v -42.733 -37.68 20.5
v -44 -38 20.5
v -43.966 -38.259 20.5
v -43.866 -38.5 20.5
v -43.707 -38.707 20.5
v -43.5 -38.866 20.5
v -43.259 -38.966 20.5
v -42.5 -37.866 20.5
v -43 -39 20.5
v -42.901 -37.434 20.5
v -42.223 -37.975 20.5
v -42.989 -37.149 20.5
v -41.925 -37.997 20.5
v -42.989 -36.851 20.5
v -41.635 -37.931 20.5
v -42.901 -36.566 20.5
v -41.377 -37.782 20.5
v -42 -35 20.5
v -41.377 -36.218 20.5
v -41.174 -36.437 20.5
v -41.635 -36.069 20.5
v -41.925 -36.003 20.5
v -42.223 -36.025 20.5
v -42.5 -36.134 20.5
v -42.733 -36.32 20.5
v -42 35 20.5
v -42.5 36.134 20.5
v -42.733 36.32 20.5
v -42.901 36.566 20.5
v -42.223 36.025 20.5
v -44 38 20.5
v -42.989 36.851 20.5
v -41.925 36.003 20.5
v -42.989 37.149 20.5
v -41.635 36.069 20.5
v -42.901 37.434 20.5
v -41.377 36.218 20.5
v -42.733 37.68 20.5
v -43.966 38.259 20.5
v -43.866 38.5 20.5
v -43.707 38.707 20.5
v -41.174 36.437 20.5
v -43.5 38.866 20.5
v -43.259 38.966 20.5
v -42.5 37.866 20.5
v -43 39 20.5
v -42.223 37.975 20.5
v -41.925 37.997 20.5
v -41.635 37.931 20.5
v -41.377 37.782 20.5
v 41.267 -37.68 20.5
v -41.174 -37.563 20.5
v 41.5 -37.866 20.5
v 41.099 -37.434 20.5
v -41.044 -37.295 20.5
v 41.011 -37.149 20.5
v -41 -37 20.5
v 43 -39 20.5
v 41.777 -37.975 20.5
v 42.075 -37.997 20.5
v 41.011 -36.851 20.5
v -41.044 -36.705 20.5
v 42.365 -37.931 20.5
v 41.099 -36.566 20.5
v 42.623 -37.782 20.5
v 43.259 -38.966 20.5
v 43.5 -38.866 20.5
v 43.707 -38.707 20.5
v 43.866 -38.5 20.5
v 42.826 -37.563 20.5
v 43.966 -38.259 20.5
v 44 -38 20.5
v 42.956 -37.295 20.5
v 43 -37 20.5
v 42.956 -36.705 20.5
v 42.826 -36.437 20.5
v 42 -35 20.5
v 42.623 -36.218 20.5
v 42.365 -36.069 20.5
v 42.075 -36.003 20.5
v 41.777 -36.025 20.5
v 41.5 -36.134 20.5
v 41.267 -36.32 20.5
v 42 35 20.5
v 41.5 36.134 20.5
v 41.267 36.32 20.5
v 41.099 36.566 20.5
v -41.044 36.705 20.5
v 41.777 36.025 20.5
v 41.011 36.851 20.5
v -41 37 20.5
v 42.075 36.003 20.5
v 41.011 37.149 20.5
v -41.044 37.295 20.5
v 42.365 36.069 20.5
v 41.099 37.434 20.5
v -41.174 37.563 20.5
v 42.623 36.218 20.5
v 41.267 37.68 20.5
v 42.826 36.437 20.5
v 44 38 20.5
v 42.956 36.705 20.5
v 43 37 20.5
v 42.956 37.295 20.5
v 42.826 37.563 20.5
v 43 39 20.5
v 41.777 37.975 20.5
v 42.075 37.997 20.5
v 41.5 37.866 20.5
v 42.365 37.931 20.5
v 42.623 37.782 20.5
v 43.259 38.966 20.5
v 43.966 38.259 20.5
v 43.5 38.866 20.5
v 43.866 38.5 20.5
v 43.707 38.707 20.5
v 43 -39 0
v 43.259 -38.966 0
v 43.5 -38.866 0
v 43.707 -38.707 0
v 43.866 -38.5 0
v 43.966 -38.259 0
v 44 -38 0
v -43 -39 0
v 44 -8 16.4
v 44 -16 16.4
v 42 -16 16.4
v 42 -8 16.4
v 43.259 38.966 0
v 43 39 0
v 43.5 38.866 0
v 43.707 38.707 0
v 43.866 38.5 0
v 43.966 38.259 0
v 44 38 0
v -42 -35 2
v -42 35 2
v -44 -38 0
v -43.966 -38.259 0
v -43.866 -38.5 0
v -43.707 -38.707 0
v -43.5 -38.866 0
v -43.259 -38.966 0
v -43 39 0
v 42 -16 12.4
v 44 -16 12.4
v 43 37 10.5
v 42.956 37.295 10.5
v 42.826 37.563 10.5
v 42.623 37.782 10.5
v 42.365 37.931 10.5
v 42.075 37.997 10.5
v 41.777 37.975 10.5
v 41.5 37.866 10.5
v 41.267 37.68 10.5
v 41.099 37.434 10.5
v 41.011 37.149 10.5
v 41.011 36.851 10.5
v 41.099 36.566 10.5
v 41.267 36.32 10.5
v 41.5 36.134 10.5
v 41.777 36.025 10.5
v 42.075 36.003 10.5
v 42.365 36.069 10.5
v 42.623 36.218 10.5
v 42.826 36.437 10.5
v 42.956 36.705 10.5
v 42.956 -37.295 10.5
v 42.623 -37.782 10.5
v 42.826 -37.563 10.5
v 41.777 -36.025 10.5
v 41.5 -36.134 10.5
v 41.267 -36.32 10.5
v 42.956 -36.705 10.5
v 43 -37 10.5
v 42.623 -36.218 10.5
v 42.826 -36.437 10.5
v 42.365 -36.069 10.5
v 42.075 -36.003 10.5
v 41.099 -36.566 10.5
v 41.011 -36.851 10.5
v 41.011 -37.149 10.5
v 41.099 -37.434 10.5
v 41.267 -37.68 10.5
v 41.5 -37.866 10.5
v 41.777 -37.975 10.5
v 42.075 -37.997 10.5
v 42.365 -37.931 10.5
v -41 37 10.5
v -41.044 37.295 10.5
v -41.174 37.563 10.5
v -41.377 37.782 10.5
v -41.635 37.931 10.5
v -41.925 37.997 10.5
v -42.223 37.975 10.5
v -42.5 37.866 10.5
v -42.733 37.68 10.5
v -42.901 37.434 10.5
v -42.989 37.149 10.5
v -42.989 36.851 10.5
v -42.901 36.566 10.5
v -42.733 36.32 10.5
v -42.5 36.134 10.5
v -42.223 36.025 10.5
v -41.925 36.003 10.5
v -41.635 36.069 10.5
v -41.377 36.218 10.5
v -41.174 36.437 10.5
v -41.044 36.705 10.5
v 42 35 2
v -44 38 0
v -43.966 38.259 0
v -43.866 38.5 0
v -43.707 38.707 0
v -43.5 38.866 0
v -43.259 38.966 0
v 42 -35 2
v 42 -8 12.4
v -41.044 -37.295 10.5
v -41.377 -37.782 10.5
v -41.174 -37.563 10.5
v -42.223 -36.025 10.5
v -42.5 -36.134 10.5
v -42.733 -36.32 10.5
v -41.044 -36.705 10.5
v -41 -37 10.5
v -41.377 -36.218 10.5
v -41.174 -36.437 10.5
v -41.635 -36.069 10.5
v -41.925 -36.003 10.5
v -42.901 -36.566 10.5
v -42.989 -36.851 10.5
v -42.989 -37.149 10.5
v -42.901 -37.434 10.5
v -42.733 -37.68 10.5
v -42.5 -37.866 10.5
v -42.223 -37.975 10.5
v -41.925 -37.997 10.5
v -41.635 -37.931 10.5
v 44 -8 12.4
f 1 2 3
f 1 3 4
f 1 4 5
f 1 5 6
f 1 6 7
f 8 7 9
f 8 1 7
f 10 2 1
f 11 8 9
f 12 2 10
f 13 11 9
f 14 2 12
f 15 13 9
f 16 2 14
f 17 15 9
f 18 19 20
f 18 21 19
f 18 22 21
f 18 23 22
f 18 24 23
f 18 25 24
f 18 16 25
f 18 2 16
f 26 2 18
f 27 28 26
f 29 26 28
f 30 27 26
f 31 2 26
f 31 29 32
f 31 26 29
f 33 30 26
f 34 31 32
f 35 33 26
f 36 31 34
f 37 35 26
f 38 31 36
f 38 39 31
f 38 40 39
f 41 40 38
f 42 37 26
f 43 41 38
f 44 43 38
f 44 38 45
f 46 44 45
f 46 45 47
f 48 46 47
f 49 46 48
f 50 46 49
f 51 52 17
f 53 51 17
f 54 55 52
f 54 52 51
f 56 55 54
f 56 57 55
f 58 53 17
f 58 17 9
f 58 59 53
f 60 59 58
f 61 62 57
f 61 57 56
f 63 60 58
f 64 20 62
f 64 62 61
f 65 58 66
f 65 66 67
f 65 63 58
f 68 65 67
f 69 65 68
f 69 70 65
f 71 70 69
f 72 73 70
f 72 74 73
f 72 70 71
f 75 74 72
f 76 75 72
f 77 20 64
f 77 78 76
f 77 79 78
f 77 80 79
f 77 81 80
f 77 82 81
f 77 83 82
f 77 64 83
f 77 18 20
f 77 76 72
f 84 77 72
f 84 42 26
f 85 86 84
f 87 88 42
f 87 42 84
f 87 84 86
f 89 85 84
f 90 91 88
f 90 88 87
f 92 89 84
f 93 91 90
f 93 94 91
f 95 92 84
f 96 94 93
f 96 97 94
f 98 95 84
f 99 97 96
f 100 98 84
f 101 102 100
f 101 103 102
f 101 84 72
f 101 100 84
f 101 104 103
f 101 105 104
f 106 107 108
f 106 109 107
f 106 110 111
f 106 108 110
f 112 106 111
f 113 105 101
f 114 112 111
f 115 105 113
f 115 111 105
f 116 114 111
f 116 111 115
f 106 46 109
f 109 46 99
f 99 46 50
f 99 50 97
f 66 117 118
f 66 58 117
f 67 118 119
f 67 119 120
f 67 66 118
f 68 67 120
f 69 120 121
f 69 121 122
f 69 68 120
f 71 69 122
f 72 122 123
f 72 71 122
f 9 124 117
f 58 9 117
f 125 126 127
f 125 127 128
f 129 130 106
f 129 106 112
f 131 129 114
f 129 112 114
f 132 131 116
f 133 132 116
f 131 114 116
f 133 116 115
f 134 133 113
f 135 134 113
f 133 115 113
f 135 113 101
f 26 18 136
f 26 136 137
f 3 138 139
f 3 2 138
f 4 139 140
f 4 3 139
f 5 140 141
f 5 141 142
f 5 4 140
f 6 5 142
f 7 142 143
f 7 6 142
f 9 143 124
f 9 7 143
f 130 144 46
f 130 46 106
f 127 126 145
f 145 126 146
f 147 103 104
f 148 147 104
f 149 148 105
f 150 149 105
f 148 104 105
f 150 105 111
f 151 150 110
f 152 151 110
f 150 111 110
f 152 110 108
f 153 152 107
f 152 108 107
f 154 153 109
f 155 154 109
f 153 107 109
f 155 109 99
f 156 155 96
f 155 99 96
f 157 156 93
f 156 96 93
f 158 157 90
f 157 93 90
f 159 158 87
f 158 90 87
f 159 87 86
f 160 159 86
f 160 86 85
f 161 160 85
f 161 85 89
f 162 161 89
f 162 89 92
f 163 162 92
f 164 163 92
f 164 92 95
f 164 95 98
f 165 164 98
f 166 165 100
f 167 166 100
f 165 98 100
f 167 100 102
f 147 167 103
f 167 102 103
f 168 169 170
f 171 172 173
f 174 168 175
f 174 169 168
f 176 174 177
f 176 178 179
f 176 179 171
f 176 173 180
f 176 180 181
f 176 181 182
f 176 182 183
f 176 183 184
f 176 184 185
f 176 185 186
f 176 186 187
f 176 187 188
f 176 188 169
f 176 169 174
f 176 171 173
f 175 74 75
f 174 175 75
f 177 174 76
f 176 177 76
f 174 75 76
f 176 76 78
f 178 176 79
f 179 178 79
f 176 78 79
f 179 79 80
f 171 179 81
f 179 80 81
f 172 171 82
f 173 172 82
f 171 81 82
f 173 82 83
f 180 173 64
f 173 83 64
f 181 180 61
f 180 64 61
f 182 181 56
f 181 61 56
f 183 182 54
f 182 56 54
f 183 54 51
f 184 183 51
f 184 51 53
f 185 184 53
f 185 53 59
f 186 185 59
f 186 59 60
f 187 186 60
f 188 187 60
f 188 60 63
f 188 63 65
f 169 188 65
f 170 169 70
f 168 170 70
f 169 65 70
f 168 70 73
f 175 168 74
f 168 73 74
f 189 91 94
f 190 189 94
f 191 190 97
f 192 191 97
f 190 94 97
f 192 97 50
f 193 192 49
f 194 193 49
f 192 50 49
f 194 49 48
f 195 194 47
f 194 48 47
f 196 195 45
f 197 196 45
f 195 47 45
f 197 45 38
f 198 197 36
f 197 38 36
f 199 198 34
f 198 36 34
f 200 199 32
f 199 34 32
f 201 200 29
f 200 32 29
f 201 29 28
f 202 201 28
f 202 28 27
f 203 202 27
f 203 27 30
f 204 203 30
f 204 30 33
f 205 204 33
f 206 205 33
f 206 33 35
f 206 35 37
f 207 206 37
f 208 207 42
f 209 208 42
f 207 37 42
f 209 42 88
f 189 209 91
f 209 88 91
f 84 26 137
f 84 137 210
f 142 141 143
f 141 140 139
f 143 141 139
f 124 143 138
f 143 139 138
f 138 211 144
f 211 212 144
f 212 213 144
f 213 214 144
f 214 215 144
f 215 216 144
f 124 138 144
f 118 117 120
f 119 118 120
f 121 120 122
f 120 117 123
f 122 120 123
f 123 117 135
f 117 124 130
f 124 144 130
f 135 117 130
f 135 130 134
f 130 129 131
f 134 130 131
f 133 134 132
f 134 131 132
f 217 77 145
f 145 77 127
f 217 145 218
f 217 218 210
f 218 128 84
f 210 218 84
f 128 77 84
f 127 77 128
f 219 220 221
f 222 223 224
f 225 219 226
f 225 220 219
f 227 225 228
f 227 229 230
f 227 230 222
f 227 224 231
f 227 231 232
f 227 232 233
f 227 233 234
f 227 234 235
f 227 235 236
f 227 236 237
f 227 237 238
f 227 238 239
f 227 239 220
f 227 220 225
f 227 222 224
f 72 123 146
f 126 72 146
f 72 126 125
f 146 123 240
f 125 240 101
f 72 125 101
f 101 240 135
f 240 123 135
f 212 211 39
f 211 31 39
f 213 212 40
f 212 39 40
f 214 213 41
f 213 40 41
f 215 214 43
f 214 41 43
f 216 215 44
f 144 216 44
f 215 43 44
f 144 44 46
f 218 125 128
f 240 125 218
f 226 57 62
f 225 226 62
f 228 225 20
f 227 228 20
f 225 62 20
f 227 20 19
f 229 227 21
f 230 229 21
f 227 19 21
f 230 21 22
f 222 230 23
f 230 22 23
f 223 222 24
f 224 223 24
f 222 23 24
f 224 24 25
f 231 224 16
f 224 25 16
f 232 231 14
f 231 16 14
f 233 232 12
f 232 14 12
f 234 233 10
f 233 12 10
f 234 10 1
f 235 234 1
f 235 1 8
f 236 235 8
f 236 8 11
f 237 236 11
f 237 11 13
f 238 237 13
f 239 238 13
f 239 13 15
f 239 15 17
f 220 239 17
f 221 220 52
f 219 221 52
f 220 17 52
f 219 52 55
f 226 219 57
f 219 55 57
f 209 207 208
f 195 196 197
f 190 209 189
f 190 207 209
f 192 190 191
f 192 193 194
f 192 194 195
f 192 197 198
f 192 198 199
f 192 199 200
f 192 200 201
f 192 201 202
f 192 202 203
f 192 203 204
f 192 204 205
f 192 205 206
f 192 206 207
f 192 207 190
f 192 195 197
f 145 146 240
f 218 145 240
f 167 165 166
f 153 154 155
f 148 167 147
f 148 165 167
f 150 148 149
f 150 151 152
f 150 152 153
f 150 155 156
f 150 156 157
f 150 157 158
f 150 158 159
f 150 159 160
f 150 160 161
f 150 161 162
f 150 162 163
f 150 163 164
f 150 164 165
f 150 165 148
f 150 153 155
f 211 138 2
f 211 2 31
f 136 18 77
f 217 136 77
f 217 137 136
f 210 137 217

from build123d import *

# Parameters (mm, degrees)
SKETCH2_W           = 88
SKETCH2_H           = 78
BOSS_EXTRUDE1_DEPTH = 20.5
SKETCH5_W           = 84
SKETCH5_H           = 70
CUT_EXTRUDE1_DEPTH  = 18.5
SKETCH6_W           = 4
SKETCH6_H           = 8
CUT_EXTRUDE2_DEPTH  = 18.5
SKETCH7_R           = 1
CUT_EXTRUDE3_DEPTH  = 10
FILLET2_R           = 1


with BuildPart() as part:
    # Sketch2 → Boss-Extrude1 (new body)
    with BuildSketch(Plane.XY):
        Rectangle(SKETCH2_W, SKETCH2_H)
    extrude(amount=BOSS_EXTRUDE1_DEPTH)

    # Sketch5 → Cut-Extrude1 (cut)
    with BuildSketch(Plane.XY.offset(20.5)):
        Rectangle(SKETCH5_W, SKETCH5_H)
    extrude(amount=-CUT_EXTRUDE1_DEPTH, mode=Mode.SUBTRACT)

    # Sketch6 → Cut-Extrude2 (cut)
    with BuildSketch(Plane(origin=(44, 0, 0), x_dir=(0, 0, -1), z_dir=(1, 0, 0))):
        with Locations((-14.4, -12)):
            Rectangle(SKETCH6_W, SKETCH6_H)
    extrude(amount=-CUT_EXTRUDE2_DEPTH, mode=Mode.SUBTRACT)

    # Sketch7 → Cut-Extrude3 (cut)
    with BuildSketch(Plane.XY.offset(20.5)):
        with Locations((-42, 37)):
            Circle(SKETCH7_R)
        with Locations((-42, -37)):
            Circle(SKETCH7_R)
        with Locations((42, -37)):
            Circle(SKETCH7_R)
        with Locations((42, 37)):
            Circle(SKETCH7_R)
    extrude(amount=-CUT_EXTRUDE3_DEPTH, mode=Mode.SUBTRACT)

    # Fillet2
    fillet2_edges = [part.edges().sort_by_distance(p)[0] for p in [
        (44, -39, 10.25),
        (-44, -39, 10.25),
        (-44, 39, 10.25),
        (44, 39, 10.25),
    ]]
    fillet(fillet2_edges, radius=FILLET2_R)


solid = part.part
